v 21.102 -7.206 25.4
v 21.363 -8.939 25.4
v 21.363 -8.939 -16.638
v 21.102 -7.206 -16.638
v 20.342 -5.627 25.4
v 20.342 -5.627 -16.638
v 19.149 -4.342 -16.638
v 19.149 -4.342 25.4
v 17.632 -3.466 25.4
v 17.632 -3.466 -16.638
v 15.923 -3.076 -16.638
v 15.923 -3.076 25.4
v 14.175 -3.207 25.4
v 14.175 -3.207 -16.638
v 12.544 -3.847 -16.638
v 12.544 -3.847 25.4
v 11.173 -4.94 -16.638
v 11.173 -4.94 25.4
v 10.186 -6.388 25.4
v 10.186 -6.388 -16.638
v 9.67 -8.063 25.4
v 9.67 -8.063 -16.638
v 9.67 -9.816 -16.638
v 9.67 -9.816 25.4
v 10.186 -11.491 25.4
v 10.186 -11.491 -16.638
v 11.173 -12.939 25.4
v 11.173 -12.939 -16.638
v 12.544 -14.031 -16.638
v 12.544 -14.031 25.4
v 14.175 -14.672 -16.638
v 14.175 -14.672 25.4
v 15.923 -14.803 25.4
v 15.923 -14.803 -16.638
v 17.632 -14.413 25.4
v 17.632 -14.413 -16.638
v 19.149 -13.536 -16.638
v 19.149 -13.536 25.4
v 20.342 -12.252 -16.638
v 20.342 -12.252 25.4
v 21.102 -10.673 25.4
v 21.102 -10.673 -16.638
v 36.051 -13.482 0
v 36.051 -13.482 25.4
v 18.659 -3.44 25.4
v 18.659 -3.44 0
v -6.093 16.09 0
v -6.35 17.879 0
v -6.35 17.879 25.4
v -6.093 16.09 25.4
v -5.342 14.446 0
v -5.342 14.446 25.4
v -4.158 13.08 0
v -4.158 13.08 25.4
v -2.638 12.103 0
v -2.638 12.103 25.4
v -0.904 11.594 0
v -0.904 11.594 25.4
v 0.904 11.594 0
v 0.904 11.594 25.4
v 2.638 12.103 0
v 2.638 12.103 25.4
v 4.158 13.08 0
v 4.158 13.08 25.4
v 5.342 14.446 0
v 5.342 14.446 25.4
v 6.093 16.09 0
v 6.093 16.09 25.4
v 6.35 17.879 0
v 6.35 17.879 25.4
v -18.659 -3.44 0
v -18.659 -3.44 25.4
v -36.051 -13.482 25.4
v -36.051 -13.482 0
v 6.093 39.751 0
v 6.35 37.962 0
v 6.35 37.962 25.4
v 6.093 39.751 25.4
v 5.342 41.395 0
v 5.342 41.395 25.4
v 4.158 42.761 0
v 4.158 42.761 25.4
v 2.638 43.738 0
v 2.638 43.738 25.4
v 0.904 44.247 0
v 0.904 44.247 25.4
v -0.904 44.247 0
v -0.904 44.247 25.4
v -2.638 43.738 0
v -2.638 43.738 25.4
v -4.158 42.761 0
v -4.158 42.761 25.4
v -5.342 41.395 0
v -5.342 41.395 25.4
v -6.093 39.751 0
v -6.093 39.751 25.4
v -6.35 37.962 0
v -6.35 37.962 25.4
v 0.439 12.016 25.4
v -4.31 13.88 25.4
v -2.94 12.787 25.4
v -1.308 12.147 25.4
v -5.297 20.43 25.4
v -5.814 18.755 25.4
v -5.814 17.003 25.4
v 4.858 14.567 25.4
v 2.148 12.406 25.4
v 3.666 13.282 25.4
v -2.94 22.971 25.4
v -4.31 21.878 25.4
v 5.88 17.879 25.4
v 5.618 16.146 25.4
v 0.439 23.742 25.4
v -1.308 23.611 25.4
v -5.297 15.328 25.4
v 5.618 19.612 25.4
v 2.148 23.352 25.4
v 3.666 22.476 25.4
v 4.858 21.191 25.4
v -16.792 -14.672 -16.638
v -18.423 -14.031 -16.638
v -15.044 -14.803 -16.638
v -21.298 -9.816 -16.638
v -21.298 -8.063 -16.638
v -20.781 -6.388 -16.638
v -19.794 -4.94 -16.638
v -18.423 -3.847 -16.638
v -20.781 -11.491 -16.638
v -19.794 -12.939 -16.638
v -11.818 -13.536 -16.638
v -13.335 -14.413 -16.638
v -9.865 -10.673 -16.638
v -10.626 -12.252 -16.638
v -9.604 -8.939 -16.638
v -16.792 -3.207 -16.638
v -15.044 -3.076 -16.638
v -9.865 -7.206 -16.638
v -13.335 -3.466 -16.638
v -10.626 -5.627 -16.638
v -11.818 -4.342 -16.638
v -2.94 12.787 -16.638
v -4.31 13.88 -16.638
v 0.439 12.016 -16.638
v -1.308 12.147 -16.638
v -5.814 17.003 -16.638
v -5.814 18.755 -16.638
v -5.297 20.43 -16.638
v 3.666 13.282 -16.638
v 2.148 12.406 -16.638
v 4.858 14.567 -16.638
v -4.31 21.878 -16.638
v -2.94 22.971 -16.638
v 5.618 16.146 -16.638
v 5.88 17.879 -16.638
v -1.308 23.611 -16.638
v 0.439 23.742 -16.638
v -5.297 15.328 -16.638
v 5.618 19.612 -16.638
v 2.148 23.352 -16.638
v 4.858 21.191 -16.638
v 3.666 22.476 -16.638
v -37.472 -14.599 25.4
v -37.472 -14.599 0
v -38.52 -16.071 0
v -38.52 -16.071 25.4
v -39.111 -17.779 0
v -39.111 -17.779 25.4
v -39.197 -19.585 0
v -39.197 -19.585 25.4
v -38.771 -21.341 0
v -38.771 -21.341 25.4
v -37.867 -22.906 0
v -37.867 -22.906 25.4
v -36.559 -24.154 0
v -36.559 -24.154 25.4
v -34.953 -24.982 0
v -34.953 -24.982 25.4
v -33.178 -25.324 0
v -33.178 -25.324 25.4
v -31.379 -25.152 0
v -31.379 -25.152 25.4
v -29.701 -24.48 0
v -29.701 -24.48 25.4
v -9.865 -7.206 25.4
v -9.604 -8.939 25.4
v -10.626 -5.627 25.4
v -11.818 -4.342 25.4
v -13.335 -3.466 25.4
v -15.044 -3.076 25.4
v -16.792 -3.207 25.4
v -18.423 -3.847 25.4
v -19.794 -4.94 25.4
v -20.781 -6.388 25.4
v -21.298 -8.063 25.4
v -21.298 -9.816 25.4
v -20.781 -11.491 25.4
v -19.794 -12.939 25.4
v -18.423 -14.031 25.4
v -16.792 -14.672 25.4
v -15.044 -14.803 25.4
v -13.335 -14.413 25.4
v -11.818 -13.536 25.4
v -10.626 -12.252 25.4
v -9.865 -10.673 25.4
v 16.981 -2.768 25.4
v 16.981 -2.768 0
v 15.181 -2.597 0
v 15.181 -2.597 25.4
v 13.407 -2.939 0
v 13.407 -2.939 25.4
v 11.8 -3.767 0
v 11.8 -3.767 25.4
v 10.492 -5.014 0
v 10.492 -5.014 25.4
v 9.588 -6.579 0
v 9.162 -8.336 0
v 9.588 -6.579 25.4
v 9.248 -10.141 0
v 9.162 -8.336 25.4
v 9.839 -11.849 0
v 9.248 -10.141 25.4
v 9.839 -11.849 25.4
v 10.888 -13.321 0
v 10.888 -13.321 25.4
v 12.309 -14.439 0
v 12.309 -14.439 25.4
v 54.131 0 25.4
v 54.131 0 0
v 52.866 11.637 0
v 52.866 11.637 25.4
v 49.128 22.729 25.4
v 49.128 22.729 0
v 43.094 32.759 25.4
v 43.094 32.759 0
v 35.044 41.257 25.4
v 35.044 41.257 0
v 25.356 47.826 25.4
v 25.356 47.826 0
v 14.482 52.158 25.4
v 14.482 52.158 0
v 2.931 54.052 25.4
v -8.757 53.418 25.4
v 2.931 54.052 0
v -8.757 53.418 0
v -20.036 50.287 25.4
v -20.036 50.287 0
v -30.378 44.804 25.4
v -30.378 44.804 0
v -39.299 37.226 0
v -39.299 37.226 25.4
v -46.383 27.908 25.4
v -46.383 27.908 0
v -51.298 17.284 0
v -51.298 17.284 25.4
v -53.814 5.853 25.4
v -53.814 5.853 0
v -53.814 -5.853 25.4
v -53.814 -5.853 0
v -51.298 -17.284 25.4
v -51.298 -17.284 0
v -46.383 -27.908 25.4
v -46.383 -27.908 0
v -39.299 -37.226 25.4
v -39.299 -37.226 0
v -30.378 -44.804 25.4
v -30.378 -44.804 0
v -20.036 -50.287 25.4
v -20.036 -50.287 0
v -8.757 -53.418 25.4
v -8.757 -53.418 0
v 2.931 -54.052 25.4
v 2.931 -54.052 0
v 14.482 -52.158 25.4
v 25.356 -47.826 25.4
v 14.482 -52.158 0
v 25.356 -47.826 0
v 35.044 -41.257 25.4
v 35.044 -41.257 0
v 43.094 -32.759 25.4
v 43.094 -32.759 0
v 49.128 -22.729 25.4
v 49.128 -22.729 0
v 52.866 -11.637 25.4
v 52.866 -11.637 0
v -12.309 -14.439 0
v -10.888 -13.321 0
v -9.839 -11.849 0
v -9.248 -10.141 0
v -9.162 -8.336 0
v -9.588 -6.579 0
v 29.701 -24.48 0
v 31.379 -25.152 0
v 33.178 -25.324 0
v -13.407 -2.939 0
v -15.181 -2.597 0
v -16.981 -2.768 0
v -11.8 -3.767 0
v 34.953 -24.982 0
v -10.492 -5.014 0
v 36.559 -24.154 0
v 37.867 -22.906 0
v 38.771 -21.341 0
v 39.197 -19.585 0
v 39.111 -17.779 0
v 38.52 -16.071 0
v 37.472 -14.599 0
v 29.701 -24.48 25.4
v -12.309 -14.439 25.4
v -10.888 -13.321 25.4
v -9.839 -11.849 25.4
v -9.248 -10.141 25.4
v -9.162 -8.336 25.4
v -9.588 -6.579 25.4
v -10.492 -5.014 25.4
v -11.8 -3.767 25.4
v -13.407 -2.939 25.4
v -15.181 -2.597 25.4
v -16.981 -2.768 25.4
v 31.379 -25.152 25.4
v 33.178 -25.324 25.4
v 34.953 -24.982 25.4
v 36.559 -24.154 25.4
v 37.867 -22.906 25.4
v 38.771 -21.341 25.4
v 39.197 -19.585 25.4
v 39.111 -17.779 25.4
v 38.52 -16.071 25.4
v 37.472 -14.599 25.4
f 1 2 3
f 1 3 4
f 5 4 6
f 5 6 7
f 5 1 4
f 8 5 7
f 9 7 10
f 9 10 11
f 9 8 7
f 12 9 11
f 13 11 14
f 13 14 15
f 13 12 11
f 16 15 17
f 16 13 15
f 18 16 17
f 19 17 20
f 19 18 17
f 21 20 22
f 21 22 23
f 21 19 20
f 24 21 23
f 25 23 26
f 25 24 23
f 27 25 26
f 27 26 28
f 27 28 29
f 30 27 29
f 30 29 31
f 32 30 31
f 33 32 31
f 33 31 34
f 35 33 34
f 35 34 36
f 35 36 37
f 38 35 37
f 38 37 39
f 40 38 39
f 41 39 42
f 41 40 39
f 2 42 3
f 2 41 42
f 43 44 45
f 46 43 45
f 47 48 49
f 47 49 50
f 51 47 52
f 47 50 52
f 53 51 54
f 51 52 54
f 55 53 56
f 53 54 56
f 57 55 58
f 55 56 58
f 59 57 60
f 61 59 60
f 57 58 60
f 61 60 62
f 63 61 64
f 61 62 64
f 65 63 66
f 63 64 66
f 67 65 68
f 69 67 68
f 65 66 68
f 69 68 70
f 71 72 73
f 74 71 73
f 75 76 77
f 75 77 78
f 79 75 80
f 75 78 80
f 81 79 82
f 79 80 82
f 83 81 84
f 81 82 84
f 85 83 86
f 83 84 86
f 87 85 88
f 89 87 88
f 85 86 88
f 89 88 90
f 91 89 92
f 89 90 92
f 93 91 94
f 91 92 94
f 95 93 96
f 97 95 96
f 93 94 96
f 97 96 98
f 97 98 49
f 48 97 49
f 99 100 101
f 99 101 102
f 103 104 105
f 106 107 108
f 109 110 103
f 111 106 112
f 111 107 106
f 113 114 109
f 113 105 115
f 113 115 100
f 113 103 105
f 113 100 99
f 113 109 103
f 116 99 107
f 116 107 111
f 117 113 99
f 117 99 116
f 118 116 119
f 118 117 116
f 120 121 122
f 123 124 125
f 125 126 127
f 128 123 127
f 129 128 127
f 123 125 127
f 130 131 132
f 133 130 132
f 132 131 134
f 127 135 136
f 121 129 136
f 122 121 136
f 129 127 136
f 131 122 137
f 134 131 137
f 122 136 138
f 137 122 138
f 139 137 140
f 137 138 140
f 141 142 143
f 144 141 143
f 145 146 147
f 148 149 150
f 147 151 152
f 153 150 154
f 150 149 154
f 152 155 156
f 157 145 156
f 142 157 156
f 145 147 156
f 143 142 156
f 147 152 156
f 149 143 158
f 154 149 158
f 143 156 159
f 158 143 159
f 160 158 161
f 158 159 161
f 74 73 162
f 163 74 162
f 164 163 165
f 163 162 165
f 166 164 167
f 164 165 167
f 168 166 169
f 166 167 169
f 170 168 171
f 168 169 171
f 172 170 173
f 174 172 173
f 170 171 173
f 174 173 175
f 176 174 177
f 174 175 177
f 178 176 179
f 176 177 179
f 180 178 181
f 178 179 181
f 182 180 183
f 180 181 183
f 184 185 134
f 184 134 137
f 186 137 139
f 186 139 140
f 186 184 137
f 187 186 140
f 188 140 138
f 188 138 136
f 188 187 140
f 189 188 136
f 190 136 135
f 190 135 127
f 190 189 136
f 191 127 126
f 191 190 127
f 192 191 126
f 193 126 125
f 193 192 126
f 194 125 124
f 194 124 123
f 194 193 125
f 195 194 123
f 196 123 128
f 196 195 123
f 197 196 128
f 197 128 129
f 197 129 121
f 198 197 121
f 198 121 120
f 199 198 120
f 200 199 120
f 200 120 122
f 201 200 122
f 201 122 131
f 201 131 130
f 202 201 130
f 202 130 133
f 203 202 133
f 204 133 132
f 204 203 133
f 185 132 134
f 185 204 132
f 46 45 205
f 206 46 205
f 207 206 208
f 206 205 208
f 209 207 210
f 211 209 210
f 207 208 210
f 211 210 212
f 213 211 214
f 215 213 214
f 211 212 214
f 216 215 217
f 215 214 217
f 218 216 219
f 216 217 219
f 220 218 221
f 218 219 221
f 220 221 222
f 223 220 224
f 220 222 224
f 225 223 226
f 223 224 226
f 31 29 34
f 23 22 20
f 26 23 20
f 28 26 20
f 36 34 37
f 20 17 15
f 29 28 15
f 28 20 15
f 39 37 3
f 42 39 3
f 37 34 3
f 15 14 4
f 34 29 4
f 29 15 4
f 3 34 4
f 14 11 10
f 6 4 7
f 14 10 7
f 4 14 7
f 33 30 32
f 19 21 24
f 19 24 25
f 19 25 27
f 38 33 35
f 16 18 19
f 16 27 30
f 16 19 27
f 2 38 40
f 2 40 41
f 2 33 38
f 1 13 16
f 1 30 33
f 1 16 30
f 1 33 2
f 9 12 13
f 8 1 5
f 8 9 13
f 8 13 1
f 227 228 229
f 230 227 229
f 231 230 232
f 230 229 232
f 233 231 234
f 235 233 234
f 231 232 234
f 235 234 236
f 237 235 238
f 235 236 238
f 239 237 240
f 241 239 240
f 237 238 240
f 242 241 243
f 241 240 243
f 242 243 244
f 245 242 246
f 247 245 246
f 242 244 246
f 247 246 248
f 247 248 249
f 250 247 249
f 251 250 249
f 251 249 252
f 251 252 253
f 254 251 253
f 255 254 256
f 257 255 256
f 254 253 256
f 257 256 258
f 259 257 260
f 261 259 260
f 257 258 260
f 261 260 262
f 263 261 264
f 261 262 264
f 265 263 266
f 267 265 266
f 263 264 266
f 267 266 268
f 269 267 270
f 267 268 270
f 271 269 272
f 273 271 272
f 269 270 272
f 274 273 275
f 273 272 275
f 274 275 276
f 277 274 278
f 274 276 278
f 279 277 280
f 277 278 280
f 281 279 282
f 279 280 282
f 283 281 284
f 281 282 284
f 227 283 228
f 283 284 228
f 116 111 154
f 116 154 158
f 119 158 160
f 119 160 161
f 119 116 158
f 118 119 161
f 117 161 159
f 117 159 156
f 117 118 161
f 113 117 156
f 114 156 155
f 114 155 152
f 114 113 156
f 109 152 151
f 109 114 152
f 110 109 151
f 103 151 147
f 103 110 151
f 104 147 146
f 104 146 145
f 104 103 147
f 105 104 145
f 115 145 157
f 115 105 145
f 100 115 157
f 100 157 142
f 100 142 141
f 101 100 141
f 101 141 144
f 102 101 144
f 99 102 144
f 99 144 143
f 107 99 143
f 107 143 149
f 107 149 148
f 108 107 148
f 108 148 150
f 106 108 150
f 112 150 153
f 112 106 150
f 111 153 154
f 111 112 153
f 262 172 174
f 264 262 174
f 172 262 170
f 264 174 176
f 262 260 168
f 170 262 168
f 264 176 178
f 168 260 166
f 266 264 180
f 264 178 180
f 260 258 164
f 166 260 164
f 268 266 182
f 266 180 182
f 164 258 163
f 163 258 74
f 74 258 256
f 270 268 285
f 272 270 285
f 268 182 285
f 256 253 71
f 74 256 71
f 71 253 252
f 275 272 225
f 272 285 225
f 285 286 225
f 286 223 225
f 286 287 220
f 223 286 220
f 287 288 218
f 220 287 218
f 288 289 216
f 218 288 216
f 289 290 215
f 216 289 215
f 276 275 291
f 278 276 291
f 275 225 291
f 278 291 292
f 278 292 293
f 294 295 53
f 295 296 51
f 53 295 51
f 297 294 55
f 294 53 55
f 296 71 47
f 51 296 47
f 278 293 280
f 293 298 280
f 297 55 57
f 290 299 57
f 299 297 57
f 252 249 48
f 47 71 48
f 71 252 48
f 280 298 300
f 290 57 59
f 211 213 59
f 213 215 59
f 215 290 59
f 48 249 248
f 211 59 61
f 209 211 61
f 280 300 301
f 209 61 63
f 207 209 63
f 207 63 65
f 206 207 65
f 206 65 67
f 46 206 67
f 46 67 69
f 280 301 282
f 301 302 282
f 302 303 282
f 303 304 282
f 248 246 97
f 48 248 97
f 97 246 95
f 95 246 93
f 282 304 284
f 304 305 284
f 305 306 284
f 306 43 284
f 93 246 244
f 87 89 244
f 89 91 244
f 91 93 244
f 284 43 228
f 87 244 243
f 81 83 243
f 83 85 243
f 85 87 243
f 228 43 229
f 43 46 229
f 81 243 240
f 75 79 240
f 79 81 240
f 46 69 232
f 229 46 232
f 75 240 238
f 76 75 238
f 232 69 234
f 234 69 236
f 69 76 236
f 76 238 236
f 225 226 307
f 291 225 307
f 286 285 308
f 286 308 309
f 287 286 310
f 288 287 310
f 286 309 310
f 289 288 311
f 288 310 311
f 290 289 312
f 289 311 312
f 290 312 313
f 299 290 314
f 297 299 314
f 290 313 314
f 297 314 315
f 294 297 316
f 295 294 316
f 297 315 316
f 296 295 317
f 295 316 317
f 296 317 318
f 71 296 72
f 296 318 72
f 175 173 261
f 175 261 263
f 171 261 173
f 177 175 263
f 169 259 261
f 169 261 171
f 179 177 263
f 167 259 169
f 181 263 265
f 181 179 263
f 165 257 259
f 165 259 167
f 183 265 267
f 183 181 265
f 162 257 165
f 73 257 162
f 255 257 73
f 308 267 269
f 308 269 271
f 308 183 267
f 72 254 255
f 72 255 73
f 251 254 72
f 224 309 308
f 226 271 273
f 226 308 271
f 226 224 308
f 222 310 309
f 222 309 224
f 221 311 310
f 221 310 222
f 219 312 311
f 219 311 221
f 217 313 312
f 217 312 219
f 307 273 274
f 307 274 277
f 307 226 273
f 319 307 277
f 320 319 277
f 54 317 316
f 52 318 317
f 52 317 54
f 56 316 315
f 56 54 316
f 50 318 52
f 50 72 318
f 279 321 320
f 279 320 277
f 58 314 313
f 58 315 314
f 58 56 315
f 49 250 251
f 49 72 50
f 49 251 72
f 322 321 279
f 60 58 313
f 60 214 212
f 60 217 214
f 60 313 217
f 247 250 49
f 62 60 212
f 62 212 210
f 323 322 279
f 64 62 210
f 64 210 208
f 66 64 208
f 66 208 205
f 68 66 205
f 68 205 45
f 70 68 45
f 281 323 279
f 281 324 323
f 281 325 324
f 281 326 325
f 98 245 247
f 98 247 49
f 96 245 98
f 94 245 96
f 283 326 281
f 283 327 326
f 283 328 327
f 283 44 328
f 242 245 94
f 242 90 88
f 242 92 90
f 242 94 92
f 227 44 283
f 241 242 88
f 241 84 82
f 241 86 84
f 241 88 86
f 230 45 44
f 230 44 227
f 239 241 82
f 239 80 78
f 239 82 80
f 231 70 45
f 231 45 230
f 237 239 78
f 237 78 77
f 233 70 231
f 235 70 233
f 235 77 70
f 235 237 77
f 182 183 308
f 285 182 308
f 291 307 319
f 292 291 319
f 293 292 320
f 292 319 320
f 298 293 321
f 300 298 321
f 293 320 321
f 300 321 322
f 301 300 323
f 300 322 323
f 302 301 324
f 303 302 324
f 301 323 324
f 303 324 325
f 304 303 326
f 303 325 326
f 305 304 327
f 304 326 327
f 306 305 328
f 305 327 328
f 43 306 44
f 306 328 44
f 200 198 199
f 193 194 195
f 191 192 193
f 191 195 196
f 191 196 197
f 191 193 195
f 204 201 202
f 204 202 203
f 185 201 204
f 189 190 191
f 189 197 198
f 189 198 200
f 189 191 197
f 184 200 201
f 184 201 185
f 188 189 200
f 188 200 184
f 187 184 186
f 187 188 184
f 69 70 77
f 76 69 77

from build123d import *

# Parameters (mm, degrees)
F0_R     = 54.131436
F1_DEPTH = 25.4
F3_DEPTH = 25.401
F4_R     = 5.879706
F5_DEPTH = 42.038262


with BuildPart() as f1:
    # F0 (on Top) → F1 (new body)
    with BuildSketch(Plane.XY):
        Circle(F0_R)
    extrude(amount=F1_DEPTH)

    # F2 (on face) → F3 (cut, through all)
    with BuildSketch(Plane.XY.offset(25.4)):
        with BuildLine():
            ThreePointArc((-36.051047, -13.481734), (-38.375309, -22.155995), (-29.701047, -24.480256))
            Line((-29.701047, -24.480256), (-12.30856, -14.438699))
            ThreePointArc((-12.30856, -14.438699), (-9.984299, -5.764438), (-18.65856, -3.440176))
            Line((-18.65856, -3.440176), (-36.051047, -13.481734))
        make_face()
        with BuildLine():
            ThreePointArc((6.35, 37.96199), (0, 44.31199), (-6.35, 37.96199))
            Line((-6.35, 37.96199), (-6.35, 17.878875))
            ThreePointArc((-6.35, 17.878875), (0, 11.528875), (6.35, 17.878875))
            Line((6.35, 17.878875), (6.35, 37.96199))
        make_face()
        with BuildLine():
            ThreePointArc((29.701047, -24.480256), (38.375309, -22.155995), (36.051047, -13.481734))
            Line((36.051047, -13.481734), (18.65856, -3.440176))
            ThreePointArc((18.65856, -3.440176), (9.984299, -5.764438), (12.30856, -14.438699))
            Line((12.30856, -14.438699), (29.701047, -24.480256))
        make_face()
    extrude(amount=-F3_DEPTH, mode=Mode.SUBTRACT)


with BuildPart() as f5:
    # F4 (on face) → F5 (new body)
    with BuildSketch(Plane.XY.offset(25.4)):
        with Locations((-15.48356, -8.939438)):
            Circle(F4_R)
        with Locations((15.48356, -8.939438)):
            Circle(F4_R)
        with Locations((0, 17.878875)):
            Circle(F4_R)
    extrude(amount=-F5_DEPTH)


solid = Compound([f1.part, f5.part])
